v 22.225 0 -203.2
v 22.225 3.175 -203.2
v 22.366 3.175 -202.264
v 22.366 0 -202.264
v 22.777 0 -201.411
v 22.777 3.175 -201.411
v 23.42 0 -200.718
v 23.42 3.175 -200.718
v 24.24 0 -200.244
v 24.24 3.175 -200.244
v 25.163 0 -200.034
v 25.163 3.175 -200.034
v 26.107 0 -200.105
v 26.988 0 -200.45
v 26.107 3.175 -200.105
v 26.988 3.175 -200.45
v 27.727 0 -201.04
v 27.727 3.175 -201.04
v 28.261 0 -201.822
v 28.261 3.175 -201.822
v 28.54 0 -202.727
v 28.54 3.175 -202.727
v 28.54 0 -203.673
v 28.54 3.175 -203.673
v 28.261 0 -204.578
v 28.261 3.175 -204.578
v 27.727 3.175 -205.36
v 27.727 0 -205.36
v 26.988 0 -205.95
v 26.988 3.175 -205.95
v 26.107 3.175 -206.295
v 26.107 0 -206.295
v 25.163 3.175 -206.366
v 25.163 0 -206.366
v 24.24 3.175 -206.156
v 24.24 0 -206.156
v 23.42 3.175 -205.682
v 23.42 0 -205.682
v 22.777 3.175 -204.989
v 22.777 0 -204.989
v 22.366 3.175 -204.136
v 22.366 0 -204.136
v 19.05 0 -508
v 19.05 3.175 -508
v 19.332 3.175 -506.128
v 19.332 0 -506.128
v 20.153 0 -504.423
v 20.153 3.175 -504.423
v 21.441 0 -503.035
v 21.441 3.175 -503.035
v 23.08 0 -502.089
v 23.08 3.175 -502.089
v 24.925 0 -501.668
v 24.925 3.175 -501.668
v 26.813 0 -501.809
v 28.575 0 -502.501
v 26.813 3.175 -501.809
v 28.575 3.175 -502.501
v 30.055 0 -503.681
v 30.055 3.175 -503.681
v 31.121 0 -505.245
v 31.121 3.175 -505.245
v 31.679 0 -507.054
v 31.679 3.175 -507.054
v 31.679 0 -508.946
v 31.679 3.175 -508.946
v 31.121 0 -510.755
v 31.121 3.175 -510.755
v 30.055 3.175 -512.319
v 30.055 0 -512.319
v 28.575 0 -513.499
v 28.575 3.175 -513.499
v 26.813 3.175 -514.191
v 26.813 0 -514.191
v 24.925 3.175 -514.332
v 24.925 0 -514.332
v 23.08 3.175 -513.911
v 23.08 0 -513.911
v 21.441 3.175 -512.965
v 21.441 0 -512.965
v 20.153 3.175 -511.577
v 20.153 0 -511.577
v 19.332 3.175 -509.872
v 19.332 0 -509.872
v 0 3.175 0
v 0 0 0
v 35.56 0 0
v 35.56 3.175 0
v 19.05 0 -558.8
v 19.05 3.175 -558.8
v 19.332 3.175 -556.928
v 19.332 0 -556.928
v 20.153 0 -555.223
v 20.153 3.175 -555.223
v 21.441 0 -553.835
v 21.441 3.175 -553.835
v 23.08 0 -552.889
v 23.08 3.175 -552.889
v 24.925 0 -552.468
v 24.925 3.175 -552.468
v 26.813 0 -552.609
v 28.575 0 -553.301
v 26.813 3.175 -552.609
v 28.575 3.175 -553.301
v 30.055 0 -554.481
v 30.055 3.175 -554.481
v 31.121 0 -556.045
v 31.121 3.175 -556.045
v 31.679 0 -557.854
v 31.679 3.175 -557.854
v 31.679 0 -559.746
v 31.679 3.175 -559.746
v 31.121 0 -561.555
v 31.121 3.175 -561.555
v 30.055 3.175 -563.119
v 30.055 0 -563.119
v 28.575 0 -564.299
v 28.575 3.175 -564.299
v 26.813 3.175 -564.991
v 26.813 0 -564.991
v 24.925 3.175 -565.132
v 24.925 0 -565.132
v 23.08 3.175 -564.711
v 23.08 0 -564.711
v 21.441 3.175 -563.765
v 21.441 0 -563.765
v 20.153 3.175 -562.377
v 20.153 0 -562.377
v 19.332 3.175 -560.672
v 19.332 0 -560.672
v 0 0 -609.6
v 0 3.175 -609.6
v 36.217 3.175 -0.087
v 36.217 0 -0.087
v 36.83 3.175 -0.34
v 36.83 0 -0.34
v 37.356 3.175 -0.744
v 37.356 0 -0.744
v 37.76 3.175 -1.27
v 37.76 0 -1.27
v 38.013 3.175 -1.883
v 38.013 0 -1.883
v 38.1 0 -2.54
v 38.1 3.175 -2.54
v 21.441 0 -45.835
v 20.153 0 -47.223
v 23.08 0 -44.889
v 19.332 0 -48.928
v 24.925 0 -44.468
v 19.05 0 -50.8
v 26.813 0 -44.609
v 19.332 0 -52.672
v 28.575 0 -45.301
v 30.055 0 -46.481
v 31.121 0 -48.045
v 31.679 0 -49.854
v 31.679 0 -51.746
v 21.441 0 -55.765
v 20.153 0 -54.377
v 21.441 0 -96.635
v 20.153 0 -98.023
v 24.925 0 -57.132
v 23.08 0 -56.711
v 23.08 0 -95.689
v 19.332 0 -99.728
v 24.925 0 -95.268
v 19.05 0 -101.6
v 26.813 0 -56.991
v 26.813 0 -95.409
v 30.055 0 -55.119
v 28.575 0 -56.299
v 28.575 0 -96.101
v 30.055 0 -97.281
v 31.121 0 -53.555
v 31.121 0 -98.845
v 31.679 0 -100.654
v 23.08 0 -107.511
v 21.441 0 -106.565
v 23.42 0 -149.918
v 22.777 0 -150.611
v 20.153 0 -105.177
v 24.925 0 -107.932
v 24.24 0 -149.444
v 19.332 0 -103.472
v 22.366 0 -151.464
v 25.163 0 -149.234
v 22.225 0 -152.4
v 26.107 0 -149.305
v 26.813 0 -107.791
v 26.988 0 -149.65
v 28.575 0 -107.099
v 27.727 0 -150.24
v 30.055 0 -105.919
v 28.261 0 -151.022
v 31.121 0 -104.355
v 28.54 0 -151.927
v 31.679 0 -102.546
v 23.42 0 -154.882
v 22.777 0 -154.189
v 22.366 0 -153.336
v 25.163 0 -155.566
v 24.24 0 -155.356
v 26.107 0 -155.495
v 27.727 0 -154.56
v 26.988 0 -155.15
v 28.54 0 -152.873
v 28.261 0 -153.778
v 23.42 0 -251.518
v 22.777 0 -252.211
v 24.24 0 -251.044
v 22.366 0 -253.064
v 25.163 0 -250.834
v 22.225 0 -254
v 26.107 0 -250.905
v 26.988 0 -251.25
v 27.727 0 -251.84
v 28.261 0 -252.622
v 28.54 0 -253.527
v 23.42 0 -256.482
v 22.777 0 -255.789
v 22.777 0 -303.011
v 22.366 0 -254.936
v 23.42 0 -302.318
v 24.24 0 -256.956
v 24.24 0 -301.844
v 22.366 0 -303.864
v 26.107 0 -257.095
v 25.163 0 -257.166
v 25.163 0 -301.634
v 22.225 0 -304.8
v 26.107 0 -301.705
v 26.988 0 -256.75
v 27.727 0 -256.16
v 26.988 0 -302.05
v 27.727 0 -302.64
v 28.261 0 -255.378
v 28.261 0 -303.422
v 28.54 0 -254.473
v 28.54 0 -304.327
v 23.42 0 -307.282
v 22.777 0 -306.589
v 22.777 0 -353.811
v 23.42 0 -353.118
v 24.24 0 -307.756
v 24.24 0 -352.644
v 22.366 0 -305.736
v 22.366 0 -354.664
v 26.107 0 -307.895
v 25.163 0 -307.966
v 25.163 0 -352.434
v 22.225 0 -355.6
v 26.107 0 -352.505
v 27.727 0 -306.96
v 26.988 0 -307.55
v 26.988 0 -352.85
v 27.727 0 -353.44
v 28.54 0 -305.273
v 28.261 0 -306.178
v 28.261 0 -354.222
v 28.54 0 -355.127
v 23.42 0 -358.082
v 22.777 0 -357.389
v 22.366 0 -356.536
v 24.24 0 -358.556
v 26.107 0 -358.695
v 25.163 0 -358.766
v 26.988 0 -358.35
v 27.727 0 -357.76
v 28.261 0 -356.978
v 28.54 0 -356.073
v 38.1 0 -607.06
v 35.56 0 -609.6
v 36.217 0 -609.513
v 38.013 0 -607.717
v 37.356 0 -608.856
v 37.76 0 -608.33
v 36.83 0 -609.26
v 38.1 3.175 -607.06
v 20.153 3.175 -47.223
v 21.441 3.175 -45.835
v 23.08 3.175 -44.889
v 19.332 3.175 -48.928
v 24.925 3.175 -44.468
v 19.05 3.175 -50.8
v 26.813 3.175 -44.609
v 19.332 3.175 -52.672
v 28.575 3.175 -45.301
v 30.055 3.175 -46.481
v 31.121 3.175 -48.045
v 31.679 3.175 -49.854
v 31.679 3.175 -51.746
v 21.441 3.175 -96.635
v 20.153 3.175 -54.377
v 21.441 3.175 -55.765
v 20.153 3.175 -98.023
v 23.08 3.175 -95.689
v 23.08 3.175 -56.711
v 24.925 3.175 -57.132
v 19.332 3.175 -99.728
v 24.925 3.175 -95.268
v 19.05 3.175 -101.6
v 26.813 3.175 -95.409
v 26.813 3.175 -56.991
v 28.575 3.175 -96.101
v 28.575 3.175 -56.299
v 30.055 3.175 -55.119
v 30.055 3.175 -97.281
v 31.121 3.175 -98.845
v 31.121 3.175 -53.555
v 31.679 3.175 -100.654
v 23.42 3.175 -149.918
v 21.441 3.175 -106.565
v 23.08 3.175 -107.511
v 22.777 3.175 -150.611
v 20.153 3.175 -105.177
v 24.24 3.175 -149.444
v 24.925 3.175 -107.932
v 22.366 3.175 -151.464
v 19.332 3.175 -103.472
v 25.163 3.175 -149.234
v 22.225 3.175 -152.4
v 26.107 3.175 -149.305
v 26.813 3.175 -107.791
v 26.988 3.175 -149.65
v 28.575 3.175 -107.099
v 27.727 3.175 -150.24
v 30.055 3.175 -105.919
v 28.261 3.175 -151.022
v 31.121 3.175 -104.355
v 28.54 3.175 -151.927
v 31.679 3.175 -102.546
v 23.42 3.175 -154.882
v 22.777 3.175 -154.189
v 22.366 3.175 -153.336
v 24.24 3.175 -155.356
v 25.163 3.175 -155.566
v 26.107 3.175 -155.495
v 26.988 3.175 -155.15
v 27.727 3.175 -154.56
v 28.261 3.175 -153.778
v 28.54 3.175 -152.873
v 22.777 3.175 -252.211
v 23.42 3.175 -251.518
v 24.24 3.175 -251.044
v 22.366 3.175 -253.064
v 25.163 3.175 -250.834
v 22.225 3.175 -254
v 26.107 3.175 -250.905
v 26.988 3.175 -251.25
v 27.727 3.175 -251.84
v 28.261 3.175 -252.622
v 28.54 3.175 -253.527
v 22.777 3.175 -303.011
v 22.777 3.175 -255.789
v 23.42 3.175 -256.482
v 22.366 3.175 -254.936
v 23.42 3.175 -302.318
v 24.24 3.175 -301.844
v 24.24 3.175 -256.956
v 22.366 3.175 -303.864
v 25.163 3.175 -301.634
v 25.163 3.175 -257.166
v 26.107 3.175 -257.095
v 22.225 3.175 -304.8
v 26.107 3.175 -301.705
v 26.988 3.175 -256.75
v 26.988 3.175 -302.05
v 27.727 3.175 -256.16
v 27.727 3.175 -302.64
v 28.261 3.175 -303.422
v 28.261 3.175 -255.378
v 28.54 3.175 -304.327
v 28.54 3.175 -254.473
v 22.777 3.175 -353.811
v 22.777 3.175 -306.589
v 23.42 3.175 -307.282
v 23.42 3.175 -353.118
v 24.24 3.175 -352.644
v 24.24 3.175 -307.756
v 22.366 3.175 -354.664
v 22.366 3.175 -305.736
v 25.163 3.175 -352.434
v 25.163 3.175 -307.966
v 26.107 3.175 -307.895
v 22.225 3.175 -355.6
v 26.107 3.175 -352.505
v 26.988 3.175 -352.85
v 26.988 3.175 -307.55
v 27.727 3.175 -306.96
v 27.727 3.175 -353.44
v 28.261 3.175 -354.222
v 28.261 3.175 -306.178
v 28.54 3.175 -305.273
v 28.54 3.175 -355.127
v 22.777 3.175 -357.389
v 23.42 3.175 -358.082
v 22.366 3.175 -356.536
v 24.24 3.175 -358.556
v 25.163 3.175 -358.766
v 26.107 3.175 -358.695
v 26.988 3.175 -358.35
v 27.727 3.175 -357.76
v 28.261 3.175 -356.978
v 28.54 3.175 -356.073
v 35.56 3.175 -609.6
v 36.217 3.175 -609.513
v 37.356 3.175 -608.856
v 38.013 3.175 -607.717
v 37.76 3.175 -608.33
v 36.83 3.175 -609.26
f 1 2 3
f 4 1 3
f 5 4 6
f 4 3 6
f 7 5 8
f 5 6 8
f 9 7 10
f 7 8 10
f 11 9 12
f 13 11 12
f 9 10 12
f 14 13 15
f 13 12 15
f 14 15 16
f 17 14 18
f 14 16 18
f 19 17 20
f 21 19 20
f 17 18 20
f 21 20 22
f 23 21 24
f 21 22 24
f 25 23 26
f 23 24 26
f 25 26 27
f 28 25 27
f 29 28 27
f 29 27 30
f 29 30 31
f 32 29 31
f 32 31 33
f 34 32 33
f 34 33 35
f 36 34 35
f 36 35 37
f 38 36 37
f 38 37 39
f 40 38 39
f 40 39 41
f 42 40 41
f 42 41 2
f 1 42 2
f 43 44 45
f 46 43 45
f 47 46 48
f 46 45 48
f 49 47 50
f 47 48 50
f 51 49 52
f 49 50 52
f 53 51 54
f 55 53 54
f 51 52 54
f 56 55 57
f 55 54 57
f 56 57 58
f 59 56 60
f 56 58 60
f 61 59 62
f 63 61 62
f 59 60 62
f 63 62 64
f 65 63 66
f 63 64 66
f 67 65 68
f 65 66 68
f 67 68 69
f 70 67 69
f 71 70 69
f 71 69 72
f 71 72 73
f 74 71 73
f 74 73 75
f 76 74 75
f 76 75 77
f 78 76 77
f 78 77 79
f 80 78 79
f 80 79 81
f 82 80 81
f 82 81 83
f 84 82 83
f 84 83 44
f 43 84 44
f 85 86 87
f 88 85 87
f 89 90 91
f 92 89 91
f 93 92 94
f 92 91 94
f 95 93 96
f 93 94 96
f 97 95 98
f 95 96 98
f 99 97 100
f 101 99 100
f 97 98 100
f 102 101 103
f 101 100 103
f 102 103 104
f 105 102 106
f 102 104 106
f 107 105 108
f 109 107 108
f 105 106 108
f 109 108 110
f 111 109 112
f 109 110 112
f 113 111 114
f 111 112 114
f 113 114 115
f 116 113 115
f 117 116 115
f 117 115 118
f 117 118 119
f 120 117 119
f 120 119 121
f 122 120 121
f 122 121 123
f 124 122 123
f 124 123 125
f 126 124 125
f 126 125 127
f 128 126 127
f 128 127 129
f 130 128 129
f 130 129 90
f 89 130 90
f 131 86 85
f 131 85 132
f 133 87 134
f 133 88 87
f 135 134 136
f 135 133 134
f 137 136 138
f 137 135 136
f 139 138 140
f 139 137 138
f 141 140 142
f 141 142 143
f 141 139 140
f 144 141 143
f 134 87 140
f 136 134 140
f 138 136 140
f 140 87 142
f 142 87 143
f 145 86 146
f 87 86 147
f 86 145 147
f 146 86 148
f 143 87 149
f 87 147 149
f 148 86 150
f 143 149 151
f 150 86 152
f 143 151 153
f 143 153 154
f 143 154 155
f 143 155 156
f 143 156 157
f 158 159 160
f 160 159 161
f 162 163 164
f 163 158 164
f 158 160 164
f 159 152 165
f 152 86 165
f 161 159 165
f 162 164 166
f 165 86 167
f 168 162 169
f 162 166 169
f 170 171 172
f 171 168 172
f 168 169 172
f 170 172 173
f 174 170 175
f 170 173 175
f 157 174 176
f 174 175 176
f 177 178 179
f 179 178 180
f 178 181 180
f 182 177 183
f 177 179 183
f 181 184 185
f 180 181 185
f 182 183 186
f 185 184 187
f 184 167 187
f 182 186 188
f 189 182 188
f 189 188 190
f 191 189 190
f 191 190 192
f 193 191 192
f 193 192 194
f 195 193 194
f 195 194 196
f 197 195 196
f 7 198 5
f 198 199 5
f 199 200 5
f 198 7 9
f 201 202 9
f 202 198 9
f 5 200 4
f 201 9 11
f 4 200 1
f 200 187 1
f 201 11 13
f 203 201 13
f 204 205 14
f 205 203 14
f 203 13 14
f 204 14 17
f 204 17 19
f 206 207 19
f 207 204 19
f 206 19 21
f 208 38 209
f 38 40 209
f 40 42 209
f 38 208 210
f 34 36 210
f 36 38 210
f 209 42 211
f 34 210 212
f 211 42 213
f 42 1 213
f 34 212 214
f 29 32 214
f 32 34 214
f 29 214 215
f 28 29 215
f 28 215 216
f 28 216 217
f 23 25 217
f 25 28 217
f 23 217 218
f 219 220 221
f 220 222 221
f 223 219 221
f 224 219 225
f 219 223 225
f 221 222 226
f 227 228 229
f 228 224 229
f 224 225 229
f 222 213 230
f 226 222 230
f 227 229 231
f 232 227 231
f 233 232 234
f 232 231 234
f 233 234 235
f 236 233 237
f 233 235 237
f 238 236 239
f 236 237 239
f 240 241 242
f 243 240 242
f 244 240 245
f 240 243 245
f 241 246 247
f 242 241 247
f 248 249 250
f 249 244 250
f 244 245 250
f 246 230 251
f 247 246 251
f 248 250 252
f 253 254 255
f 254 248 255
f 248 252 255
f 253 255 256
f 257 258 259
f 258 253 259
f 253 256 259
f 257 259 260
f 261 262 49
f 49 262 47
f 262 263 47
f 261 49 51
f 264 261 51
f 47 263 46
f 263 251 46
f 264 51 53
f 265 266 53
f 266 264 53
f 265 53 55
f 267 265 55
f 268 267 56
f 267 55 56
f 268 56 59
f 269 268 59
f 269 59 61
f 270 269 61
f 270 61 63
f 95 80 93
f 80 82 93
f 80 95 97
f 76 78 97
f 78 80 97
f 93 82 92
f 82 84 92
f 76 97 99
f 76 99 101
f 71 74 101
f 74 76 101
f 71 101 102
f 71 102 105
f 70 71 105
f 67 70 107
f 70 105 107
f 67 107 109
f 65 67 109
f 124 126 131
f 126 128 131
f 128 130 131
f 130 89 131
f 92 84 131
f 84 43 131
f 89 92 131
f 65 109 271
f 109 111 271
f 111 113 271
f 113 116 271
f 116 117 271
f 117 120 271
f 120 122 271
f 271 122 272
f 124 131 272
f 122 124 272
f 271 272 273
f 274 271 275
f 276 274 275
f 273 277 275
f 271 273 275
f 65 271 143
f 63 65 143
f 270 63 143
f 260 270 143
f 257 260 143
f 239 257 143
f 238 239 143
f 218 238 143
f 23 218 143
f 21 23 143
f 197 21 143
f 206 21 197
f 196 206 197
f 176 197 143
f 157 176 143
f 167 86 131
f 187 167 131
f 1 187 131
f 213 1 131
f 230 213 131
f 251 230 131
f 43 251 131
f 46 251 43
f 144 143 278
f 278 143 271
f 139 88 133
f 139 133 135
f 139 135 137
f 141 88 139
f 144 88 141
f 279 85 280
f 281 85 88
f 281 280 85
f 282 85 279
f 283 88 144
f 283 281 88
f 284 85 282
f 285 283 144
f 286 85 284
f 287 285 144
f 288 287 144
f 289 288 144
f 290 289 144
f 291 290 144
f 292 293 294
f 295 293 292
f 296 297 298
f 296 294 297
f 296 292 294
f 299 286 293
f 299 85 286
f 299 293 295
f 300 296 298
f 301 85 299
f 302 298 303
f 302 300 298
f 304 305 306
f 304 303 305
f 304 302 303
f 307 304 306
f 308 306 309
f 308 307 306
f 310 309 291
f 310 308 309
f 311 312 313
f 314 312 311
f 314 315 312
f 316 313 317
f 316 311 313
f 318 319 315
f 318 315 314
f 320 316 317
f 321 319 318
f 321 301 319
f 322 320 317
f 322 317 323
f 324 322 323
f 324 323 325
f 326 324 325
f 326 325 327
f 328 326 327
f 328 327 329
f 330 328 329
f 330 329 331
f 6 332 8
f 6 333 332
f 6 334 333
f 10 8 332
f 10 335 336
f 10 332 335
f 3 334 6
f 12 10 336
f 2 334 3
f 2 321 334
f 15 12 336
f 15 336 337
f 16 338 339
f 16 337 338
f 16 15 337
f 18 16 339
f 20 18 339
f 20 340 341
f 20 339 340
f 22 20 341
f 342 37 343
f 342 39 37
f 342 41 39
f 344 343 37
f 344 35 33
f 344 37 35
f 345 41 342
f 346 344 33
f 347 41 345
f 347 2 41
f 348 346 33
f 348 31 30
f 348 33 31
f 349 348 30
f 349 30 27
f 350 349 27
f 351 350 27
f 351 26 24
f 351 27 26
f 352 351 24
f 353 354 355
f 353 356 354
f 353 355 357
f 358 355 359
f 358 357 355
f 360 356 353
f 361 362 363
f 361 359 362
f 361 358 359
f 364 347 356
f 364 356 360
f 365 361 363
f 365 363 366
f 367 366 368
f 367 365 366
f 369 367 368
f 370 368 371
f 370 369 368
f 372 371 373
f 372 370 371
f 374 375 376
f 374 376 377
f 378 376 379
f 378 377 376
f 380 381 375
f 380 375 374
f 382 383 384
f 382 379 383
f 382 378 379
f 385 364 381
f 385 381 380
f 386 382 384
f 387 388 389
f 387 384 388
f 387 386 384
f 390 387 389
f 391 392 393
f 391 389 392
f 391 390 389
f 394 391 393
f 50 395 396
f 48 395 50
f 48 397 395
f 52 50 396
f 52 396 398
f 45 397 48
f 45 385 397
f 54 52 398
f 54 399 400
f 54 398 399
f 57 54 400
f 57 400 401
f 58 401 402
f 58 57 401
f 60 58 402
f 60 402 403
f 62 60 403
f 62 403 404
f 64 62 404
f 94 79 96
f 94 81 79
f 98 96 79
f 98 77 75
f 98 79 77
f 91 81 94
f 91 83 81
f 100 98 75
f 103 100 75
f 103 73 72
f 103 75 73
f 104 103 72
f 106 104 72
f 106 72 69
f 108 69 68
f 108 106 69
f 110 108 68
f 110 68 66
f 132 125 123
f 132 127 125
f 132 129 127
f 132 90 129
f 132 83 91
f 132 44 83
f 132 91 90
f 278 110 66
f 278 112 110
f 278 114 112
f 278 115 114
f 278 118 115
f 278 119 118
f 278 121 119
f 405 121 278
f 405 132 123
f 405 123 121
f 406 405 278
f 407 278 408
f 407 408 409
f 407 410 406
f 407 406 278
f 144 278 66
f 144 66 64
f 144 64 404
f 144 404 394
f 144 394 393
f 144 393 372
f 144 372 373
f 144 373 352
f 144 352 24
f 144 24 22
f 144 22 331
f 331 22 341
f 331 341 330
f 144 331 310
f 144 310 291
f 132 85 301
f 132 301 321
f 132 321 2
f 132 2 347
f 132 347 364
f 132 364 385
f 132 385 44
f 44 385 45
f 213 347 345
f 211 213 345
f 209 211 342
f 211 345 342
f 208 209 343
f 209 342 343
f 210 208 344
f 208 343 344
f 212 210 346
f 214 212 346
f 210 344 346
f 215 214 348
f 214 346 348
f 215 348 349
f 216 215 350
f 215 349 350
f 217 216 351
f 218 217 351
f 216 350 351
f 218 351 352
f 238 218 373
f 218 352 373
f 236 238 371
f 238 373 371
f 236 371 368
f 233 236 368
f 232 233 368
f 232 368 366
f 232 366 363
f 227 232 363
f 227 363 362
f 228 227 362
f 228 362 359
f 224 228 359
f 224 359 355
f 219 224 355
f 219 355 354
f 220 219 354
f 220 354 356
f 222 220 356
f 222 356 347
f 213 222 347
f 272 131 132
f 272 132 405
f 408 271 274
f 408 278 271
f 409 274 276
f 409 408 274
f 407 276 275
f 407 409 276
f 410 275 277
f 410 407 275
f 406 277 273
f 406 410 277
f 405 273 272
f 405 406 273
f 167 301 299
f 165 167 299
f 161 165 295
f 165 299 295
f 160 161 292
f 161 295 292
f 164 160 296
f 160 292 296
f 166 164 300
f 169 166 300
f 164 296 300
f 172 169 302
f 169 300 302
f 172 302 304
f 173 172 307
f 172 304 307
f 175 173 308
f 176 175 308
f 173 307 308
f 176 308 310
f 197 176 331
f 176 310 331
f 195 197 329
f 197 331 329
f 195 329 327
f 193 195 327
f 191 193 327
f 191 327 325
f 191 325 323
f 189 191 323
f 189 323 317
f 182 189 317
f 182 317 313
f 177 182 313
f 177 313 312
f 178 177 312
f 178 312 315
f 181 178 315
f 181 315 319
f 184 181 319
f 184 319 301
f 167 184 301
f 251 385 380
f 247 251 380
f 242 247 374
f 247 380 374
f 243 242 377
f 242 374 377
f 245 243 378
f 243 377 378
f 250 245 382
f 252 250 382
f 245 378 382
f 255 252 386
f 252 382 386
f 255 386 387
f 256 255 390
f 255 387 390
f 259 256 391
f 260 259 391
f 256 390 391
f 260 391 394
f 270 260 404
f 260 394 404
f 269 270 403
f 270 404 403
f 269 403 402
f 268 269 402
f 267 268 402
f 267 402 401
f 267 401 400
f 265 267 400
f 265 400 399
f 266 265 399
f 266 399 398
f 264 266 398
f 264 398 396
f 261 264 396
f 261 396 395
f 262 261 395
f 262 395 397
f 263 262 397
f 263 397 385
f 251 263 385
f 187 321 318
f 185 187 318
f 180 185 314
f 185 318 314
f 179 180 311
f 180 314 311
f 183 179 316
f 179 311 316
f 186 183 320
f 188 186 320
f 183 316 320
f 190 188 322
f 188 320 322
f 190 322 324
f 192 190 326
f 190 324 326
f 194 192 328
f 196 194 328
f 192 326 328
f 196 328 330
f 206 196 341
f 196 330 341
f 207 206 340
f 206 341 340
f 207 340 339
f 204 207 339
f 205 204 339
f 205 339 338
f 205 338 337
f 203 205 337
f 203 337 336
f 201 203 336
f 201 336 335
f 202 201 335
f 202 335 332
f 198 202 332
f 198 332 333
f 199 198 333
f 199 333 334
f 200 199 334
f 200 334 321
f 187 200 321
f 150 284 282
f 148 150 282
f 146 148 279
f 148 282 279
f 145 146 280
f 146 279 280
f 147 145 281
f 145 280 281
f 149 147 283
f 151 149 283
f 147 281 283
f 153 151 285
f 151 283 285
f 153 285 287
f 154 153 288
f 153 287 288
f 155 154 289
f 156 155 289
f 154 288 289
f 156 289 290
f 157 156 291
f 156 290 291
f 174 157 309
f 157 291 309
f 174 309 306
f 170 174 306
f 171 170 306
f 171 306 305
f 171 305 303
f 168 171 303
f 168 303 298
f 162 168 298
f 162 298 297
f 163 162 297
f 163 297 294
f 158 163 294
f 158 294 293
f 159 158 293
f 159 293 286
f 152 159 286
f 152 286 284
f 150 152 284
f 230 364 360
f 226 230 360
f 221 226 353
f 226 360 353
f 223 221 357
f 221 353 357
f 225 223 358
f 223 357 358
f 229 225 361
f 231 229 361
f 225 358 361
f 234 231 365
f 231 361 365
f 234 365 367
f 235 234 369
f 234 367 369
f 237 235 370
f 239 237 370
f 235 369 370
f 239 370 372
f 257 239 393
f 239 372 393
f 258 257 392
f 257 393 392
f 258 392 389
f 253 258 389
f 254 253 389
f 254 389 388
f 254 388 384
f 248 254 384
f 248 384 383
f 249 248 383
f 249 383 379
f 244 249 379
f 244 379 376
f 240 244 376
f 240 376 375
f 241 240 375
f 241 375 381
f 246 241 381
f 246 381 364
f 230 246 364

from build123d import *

# Parameters (mm, degrees)
SKETCH1_W           = 38.1
SKETCH1_H           = 609.6
BOSS_EXTRUDE1_DEPTH = 3.175
FILLET1_R           = 2.54
SKETCH4_R           = 3.175
SKETCH4_R_2         = 6.35
CUT_EXTRUDE1_DEPTH  = 4.175


with BuildPart() as part:
    # Sketch1 → Boss-Extrude1 (new body)
    with BuildSketch(Plane(origin=(0, 0, 0), x_dir=(1, 0, 0), z_dir=(0, 1, 0))):
        with Locations((19.05, 304.8)):
            Rectangle(SKETCH1_W, SKETCH1_H)
    extrude(amount=BOSS_EXTRUDE1_DEPTH)

    # Fillet1
    fillet1_edges = [part.edges().sort_by_distance(p)[0] for p in [
        (38.1, 1.5875, -609.6),
        (38.1, 1.5875, 0),
    ]]
    fillet(fillet1_edges, radius=FILLET1_R)

    # Sketch4 → Cut-Extrude1 (cut, through all)
    with BuildSketch(Plane(origin=(0, 3.175, 0), x_dir=(-1, 0, 0), z_dir=(0, 1, 0))):
        with Locations((-25.4, -152.4)):
            Circle(SKETCH4_R)
        with Locations((-25.4, -203.2)):
            Circle(SKETCH4_R)
        with Locations((-25.4, -254)):
            Circle(SKETCH4_R)
        with Locations((-25.4, -304.8)):
            Circle(SKETCH4_R)
        with Locations((-25.4, -355.6)):
            Circle(SKETCH4_R)
        with Locations((-25.4, -50.8)):
            Circle(SKETCH4_R_2)
        with Locations((-25.4, -101.6)):
            Circle(SKETCH4_R_2)
        with Locations((-25.4, -558.8)):
            Circle(SKETCH4_R_2)
        with Locations((-25.4, -508)):
            Circle(SKETCH4_R_2)
    extrude(amount=-CUT_EXTRUDE1_DEPTH, mode=Mode.SUBTRACT)


solid = part.part
